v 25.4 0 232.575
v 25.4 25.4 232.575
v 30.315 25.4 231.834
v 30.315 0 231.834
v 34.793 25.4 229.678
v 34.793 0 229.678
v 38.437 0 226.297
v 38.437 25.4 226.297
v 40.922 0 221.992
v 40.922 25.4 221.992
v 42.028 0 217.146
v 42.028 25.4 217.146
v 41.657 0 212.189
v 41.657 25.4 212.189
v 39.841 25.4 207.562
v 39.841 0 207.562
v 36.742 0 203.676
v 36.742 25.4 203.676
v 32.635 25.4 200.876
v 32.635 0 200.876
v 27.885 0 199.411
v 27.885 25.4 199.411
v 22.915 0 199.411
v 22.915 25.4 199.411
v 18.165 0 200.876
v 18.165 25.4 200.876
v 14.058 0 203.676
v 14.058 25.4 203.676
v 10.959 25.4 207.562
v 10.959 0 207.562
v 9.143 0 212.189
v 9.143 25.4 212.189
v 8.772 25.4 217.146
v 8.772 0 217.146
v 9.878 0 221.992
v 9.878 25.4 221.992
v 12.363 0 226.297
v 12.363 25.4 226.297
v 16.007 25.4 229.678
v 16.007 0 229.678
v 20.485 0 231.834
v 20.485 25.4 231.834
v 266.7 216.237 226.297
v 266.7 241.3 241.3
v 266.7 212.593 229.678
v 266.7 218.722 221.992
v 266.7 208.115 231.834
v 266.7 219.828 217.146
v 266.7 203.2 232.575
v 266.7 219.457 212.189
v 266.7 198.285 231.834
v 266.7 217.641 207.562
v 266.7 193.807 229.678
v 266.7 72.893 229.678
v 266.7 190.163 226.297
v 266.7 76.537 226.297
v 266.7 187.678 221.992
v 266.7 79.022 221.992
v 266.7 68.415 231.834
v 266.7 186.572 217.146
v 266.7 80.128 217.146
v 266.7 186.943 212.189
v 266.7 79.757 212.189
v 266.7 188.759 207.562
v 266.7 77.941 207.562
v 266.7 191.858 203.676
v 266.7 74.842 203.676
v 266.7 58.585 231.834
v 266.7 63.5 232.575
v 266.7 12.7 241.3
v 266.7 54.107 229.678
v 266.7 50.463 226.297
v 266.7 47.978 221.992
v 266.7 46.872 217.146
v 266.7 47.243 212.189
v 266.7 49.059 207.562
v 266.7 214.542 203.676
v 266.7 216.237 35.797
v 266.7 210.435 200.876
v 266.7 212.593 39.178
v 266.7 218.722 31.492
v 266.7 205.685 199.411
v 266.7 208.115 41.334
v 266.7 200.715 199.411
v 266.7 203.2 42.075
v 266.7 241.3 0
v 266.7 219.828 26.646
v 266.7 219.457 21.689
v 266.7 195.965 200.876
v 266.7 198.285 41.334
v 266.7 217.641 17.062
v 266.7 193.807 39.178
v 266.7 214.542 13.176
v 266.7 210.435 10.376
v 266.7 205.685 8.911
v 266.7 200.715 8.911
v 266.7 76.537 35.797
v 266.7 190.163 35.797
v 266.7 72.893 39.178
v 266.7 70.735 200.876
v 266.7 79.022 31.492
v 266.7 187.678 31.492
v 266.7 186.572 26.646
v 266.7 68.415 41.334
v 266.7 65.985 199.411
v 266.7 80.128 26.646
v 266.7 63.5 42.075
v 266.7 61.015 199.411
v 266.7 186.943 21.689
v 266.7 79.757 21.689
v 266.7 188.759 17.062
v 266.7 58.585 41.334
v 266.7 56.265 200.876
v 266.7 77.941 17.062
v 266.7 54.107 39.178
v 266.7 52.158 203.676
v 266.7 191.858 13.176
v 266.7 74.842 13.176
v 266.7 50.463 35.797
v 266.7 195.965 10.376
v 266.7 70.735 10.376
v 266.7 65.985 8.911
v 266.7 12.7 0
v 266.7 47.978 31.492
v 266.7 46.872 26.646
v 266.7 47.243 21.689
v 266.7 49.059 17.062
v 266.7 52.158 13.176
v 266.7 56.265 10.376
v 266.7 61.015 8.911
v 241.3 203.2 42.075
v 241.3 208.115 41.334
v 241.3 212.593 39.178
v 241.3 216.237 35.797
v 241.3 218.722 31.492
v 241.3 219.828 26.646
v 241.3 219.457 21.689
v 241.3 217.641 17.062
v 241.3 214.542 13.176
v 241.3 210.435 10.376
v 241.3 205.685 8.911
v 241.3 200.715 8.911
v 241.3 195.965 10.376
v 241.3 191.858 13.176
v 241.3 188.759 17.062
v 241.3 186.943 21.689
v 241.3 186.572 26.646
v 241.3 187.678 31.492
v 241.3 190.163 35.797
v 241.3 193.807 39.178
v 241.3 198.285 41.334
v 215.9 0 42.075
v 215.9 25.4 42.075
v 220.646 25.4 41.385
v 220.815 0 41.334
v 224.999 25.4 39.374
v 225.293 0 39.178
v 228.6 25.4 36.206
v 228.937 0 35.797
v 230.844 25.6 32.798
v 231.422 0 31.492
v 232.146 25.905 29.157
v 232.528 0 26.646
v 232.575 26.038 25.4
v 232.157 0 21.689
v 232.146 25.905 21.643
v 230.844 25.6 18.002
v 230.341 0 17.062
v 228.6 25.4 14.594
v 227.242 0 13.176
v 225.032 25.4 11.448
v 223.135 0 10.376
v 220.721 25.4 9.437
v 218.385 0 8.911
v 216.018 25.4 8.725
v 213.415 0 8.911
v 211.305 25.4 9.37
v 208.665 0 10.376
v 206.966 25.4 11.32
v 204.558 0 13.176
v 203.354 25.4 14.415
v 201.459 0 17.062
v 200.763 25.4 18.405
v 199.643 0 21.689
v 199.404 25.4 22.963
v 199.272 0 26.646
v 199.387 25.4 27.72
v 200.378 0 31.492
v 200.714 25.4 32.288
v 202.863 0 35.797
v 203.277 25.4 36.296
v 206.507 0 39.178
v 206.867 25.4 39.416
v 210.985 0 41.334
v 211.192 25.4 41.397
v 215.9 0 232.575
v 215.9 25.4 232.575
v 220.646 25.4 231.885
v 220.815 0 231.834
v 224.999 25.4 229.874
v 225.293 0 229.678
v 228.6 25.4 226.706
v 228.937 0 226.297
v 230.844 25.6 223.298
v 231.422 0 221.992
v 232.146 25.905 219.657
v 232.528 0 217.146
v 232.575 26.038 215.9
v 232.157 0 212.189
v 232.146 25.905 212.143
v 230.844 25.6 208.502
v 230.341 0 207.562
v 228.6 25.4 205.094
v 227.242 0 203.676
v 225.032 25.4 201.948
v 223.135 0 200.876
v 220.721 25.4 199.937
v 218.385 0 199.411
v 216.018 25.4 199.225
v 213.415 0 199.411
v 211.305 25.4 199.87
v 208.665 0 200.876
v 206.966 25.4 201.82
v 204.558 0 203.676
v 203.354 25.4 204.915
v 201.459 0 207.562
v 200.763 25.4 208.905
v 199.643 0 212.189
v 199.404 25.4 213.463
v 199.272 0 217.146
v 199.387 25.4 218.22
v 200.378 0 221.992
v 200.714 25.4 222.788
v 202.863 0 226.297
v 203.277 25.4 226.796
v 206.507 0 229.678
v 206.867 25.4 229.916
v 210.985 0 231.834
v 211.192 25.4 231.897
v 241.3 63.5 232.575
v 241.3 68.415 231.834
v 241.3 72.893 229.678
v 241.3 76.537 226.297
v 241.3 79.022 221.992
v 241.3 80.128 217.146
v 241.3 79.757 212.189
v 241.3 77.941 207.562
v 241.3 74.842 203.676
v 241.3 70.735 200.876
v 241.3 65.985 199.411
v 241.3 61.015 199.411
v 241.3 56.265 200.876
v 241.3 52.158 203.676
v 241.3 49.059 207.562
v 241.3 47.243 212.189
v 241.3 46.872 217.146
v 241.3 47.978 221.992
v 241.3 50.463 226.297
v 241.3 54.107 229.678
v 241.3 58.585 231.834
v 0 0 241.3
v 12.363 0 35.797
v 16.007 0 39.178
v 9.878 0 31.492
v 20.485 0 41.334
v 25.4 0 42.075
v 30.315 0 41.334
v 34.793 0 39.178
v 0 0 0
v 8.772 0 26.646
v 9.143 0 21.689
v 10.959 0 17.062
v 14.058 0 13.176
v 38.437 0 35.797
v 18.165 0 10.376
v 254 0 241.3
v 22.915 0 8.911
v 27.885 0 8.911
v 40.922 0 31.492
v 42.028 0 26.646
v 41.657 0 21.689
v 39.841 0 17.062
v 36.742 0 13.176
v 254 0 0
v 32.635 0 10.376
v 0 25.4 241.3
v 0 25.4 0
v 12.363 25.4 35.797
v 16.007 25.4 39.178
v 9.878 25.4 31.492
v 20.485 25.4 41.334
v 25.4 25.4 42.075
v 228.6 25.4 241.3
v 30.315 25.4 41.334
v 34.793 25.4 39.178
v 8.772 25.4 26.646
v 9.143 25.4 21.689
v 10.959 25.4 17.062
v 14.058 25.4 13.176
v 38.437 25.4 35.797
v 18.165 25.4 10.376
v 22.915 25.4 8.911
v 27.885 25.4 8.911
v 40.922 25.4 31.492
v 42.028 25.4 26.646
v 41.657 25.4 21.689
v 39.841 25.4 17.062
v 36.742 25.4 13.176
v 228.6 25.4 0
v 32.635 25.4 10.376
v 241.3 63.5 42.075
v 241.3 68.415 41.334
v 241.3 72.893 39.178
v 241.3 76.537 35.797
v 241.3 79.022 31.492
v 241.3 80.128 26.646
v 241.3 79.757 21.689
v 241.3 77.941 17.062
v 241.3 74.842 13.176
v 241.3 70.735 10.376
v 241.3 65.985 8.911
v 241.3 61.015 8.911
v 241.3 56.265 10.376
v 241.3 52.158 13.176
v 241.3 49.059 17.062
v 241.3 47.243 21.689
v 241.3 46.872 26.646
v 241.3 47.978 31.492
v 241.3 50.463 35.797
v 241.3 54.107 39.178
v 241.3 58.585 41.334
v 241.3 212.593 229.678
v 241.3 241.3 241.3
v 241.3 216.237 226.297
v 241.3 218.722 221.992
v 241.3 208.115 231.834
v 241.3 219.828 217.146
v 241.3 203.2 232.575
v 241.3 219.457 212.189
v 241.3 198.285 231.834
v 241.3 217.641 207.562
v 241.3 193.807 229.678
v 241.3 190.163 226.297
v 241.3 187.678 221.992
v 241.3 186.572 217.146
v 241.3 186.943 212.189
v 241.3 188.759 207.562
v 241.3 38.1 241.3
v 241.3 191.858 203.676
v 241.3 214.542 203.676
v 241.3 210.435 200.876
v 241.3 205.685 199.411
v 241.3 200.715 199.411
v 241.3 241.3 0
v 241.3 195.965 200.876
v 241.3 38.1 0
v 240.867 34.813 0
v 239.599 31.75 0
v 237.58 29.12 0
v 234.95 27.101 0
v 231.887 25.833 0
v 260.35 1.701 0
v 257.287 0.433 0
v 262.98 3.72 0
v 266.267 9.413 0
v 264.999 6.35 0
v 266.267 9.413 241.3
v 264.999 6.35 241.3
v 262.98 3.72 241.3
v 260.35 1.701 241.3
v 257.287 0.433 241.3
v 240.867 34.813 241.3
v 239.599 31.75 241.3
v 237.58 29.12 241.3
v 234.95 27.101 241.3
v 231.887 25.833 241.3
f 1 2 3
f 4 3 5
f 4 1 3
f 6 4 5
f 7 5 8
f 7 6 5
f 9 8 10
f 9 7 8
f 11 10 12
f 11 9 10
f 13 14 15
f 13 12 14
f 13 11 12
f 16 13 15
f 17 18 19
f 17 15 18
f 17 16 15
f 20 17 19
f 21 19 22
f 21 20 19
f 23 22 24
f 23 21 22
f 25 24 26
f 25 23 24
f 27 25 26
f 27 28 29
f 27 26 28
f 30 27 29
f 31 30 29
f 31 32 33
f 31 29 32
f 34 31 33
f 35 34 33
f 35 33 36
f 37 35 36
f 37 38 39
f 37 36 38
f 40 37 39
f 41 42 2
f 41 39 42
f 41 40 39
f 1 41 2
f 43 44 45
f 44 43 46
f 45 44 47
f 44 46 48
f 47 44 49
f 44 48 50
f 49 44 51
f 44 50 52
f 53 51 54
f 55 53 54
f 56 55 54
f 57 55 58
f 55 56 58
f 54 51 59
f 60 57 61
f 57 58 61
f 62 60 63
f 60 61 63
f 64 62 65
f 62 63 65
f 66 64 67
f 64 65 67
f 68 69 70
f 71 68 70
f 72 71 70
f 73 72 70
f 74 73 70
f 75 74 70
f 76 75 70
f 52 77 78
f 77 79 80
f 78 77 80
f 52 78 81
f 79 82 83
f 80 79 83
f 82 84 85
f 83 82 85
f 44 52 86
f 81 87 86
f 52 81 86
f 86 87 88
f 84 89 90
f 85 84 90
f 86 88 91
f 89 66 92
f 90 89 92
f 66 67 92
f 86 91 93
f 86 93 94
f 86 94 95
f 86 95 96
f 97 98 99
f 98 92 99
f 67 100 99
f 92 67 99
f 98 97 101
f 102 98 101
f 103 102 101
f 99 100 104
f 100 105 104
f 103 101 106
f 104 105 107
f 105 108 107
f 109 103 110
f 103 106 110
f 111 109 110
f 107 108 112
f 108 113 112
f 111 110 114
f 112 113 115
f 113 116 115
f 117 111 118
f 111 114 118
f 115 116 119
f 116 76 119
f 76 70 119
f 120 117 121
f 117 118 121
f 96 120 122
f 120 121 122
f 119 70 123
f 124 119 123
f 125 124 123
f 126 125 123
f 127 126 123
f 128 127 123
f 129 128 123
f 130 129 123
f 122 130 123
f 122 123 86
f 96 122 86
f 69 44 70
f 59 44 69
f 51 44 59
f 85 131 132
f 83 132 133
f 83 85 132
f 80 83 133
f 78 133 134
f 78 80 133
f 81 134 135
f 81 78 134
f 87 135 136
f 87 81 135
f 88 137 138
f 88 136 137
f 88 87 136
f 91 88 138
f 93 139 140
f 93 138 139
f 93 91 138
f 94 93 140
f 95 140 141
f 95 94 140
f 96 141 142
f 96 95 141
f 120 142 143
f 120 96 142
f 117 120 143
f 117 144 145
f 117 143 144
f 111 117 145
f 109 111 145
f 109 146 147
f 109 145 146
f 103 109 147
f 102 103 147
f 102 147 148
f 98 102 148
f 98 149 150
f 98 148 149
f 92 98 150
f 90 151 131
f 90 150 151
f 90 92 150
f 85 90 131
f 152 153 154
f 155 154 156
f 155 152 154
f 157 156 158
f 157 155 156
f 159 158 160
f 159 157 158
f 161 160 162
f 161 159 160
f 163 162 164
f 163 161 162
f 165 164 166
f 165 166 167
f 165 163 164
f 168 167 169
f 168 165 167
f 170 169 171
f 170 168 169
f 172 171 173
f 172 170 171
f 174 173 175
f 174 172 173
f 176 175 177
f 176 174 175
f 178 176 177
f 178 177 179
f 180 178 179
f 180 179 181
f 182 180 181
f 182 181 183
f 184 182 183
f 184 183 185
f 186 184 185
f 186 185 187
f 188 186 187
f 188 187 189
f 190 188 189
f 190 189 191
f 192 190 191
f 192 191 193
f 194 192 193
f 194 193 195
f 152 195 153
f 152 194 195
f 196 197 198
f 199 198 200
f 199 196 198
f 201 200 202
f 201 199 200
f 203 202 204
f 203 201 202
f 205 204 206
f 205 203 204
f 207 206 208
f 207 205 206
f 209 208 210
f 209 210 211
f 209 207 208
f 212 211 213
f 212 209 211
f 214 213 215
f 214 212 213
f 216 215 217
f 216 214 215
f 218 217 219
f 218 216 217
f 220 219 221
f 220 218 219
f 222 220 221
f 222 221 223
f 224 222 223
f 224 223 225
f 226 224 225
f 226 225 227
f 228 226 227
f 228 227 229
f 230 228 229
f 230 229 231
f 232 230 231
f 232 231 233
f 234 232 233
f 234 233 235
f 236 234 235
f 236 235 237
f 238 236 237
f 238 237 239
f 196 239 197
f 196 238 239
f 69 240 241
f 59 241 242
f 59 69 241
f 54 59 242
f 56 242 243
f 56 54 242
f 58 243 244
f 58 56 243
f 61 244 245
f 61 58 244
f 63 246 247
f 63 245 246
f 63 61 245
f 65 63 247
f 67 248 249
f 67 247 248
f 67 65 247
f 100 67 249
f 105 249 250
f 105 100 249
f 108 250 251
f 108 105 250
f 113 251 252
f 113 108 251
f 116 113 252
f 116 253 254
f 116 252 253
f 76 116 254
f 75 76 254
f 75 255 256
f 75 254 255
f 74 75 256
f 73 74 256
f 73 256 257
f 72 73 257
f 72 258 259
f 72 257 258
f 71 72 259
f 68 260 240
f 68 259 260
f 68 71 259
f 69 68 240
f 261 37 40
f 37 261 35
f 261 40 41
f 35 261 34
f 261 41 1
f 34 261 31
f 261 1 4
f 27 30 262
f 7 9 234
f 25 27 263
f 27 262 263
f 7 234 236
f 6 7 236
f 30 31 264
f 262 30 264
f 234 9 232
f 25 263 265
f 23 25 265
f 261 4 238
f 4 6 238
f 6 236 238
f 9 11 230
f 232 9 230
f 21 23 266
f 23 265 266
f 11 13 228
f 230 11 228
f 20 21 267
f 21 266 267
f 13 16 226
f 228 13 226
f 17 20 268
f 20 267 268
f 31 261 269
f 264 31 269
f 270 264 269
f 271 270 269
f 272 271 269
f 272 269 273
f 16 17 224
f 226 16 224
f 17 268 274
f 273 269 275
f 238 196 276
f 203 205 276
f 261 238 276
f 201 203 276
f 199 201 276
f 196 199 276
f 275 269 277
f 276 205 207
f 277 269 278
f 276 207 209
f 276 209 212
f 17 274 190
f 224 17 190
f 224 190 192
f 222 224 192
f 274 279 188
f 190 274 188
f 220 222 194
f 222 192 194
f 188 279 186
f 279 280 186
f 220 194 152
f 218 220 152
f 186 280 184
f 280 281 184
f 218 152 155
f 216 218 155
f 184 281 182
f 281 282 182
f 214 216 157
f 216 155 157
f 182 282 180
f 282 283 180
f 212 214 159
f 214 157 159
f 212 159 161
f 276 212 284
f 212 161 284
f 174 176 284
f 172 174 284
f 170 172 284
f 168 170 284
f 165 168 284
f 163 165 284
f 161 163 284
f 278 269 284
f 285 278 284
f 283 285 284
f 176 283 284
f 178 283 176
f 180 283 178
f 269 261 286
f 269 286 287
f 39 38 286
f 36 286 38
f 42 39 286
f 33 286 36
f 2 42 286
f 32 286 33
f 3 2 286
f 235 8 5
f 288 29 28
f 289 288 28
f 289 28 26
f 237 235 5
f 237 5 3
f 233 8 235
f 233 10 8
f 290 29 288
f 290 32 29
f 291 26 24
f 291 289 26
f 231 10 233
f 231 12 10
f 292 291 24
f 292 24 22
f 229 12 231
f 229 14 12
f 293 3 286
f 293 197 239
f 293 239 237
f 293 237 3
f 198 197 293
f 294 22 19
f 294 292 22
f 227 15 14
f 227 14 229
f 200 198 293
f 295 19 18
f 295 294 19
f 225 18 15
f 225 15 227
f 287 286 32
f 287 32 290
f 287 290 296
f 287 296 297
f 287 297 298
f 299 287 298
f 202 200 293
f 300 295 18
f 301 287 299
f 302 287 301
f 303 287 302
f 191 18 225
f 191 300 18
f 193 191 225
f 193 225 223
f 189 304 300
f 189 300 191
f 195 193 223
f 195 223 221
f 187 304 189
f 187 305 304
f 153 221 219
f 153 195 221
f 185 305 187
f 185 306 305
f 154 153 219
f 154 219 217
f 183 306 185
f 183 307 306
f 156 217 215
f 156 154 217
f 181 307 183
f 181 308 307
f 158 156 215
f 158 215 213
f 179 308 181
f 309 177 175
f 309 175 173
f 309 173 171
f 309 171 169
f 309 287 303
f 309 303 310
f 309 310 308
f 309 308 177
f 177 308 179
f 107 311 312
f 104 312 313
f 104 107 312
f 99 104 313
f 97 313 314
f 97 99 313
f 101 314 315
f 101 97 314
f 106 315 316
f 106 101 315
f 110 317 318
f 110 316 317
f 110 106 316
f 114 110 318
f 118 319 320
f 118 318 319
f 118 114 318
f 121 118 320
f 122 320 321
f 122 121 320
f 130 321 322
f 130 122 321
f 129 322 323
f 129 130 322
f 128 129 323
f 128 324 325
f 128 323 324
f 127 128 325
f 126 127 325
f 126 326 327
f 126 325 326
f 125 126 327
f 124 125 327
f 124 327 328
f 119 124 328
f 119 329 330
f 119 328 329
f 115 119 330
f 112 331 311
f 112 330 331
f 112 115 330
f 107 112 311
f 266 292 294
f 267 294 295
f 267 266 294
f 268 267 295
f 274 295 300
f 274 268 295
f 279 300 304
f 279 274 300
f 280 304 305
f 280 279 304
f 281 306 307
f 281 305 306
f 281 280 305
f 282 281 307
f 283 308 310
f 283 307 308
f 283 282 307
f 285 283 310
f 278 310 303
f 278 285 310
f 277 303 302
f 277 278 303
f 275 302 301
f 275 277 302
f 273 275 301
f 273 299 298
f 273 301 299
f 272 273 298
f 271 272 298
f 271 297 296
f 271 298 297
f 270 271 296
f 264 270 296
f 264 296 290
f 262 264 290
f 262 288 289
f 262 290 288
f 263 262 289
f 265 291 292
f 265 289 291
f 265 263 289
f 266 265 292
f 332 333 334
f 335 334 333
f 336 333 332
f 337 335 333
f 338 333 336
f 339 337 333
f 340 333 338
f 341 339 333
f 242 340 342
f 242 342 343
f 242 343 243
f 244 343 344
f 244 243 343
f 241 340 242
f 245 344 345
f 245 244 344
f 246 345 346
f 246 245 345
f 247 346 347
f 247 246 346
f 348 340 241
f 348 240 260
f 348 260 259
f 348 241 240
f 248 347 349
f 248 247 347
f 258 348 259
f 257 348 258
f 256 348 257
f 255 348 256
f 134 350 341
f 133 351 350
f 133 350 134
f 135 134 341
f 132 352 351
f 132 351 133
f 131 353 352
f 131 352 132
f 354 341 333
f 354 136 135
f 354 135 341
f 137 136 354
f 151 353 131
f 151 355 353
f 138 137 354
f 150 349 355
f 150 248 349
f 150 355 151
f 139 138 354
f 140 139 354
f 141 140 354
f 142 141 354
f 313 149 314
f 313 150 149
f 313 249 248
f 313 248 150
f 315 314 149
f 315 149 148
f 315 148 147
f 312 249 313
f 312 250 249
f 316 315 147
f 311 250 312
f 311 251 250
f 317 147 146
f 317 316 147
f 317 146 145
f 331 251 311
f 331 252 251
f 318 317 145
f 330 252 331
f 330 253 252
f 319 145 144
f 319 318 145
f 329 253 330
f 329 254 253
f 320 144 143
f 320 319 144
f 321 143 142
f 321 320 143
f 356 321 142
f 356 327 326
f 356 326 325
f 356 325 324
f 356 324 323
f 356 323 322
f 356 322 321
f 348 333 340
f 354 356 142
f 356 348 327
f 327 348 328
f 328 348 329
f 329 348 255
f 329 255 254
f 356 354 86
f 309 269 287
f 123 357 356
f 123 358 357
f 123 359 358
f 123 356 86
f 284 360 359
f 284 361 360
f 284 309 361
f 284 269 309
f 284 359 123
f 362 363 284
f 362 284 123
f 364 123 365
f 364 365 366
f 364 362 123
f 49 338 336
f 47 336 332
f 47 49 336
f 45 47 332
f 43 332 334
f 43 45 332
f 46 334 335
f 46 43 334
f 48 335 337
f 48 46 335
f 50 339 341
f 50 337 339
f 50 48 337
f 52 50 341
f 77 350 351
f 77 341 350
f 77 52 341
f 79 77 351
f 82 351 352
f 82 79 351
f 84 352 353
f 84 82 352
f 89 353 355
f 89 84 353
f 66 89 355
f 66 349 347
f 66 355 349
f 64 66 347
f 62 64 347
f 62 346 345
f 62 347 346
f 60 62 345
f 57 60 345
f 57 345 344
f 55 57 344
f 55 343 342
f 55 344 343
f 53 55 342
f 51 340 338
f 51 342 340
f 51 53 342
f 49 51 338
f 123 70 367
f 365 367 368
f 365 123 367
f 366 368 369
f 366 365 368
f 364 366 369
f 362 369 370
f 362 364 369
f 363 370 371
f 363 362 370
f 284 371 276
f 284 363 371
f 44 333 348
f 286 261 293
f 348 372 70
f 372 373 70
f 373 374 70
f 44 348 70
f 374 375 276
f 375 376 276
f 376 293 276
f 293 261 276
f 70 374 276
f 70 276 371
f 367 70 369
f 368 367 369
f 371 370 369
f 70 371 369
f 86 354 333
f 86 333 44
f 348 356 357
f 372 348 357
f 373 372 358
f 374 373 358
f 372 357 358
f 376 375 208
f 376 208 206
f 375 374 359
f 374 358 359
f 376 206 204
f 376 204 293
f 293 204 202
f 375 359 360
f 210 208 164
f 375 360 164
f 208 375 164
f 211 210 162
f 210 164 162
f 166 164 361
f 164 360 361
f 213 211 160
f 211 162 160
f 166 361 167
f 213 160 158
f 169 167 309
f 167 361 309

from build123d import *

# Parameters (mm, degrees)
SKETCH1_W               = 266.7
SKETCH1_H               = 241.3
BOSS_EXTRUDE1_DEPTH     = 25.4
SKETCH2_W               = 25.4
SKETCH2_H               = 241.3
BOSS_EXTRUDE2_DEPTH     = 215.9
FILLET1_R               = 12.7
CUT_EXTRUDE1_DEPTH      = 420.484671949
CUT_EXTRUDE1_DEPTH_BACK = 420.484671949
SKETCH4_R               = 16.6751
CUT_EXTRUDE2_DEPTH      = 418.943859924
CUT_EXTRUDE2_DEPTH_BACK = 418.943859924
SKETCH5_R               = 16.6751


with BuildPart() as part:
    # Sketch1 → Boss-Extrude1 (new body)
    with BuildSketch(Plane(origin=(0, 0, 0), x_dir=(1, 0, 0), z_dir=(0, 1, 0))):
        with Locations((133.35, -120.65)):
            Rectangle(SKETCH1_W, SKETCH1_H)
    extrude(amount=BOSS_EXTRUDE1_DEPTH)

    # Sketch2 → Boss-Extrude2 (add)
    with BuildSketch(Plane(origin=(0, 25.4, 0), x_dir=(1, 0, 0), z_dir=(0, 1, 0))):
        with Locations((254, -120.65)):
            Rectangle(SKETCH2_W, SKETCH2_H)
    extrude(amount=BOSS_EXTRUDE2_DEPTH)

    # Fillet1
    fillet1_edges = [part.edges().sort_by_distance(p)[0] for p in [
        (241.3, 25.4, 120.65),
        (266.7, 0, 120.65),
    ]]
    fillet(fillet1_edges, radius=FILLET1_R)

    # Sketch4 → Cut-Extrude1 (cut, two sides: drawn at the far end of the back side and taken through both)
    with BuildSketch(Plane(origin=(0, 25.4, 0), x_dir=(1, 0, 0), z_dir=(0, 1, 0)).offset(-CUT_EXTRUDE1_DEPTH_BACK)):
        with Locations(Location((25.4, -215.9, 0), (0, 0, 270))):
            Circle(SKETCH4_R)
        with Locations(Location((215.9, -215.9, 0), (0, 0, 270))):
            Circle(SKETCH4_R)
        with Locations(Location((25.4, -25.4, 0), (0, 0, 270))):
            Circle(SKETCH4_R)
        with Locations(Location((215.9, -25.4, 0), (0, 0, 270))):
            Circle(SKETCH4_R)
    extrude(amount=CUT_EXTRUDE1_DEPTH + CUT_EXTRUDE1_DEPTH_BACK, mode=Mode.SUBTRACT)

    # Sketch5 → Cut-Extrude2 (cut, two sides: drawn at the far end of the back side and taken through both)
    with BuildSketch(Plane.ZY.offset(-241.3).offset(-CUT_EXTRUDE2_DEPTH_BACK)):
        with Locations((25.4, 63.5)):
            Circle(SKETCH5_R)
        with Locations((25.4, 203.2)):
            Circle(SKETCH5_R)
        with Locations((215.9, 63.5)):
            Circle(SKETCH5_R)
        with Locations((215.9, 203.2)):
            Circle(SKETCH5_R)
    extrude(amount=CUT_EXTRUDE2_DEPTH + CUT_EXTRUDE2_DEPTH_BACK, mode=Mode.SUBTRACT)


solid = part.part
